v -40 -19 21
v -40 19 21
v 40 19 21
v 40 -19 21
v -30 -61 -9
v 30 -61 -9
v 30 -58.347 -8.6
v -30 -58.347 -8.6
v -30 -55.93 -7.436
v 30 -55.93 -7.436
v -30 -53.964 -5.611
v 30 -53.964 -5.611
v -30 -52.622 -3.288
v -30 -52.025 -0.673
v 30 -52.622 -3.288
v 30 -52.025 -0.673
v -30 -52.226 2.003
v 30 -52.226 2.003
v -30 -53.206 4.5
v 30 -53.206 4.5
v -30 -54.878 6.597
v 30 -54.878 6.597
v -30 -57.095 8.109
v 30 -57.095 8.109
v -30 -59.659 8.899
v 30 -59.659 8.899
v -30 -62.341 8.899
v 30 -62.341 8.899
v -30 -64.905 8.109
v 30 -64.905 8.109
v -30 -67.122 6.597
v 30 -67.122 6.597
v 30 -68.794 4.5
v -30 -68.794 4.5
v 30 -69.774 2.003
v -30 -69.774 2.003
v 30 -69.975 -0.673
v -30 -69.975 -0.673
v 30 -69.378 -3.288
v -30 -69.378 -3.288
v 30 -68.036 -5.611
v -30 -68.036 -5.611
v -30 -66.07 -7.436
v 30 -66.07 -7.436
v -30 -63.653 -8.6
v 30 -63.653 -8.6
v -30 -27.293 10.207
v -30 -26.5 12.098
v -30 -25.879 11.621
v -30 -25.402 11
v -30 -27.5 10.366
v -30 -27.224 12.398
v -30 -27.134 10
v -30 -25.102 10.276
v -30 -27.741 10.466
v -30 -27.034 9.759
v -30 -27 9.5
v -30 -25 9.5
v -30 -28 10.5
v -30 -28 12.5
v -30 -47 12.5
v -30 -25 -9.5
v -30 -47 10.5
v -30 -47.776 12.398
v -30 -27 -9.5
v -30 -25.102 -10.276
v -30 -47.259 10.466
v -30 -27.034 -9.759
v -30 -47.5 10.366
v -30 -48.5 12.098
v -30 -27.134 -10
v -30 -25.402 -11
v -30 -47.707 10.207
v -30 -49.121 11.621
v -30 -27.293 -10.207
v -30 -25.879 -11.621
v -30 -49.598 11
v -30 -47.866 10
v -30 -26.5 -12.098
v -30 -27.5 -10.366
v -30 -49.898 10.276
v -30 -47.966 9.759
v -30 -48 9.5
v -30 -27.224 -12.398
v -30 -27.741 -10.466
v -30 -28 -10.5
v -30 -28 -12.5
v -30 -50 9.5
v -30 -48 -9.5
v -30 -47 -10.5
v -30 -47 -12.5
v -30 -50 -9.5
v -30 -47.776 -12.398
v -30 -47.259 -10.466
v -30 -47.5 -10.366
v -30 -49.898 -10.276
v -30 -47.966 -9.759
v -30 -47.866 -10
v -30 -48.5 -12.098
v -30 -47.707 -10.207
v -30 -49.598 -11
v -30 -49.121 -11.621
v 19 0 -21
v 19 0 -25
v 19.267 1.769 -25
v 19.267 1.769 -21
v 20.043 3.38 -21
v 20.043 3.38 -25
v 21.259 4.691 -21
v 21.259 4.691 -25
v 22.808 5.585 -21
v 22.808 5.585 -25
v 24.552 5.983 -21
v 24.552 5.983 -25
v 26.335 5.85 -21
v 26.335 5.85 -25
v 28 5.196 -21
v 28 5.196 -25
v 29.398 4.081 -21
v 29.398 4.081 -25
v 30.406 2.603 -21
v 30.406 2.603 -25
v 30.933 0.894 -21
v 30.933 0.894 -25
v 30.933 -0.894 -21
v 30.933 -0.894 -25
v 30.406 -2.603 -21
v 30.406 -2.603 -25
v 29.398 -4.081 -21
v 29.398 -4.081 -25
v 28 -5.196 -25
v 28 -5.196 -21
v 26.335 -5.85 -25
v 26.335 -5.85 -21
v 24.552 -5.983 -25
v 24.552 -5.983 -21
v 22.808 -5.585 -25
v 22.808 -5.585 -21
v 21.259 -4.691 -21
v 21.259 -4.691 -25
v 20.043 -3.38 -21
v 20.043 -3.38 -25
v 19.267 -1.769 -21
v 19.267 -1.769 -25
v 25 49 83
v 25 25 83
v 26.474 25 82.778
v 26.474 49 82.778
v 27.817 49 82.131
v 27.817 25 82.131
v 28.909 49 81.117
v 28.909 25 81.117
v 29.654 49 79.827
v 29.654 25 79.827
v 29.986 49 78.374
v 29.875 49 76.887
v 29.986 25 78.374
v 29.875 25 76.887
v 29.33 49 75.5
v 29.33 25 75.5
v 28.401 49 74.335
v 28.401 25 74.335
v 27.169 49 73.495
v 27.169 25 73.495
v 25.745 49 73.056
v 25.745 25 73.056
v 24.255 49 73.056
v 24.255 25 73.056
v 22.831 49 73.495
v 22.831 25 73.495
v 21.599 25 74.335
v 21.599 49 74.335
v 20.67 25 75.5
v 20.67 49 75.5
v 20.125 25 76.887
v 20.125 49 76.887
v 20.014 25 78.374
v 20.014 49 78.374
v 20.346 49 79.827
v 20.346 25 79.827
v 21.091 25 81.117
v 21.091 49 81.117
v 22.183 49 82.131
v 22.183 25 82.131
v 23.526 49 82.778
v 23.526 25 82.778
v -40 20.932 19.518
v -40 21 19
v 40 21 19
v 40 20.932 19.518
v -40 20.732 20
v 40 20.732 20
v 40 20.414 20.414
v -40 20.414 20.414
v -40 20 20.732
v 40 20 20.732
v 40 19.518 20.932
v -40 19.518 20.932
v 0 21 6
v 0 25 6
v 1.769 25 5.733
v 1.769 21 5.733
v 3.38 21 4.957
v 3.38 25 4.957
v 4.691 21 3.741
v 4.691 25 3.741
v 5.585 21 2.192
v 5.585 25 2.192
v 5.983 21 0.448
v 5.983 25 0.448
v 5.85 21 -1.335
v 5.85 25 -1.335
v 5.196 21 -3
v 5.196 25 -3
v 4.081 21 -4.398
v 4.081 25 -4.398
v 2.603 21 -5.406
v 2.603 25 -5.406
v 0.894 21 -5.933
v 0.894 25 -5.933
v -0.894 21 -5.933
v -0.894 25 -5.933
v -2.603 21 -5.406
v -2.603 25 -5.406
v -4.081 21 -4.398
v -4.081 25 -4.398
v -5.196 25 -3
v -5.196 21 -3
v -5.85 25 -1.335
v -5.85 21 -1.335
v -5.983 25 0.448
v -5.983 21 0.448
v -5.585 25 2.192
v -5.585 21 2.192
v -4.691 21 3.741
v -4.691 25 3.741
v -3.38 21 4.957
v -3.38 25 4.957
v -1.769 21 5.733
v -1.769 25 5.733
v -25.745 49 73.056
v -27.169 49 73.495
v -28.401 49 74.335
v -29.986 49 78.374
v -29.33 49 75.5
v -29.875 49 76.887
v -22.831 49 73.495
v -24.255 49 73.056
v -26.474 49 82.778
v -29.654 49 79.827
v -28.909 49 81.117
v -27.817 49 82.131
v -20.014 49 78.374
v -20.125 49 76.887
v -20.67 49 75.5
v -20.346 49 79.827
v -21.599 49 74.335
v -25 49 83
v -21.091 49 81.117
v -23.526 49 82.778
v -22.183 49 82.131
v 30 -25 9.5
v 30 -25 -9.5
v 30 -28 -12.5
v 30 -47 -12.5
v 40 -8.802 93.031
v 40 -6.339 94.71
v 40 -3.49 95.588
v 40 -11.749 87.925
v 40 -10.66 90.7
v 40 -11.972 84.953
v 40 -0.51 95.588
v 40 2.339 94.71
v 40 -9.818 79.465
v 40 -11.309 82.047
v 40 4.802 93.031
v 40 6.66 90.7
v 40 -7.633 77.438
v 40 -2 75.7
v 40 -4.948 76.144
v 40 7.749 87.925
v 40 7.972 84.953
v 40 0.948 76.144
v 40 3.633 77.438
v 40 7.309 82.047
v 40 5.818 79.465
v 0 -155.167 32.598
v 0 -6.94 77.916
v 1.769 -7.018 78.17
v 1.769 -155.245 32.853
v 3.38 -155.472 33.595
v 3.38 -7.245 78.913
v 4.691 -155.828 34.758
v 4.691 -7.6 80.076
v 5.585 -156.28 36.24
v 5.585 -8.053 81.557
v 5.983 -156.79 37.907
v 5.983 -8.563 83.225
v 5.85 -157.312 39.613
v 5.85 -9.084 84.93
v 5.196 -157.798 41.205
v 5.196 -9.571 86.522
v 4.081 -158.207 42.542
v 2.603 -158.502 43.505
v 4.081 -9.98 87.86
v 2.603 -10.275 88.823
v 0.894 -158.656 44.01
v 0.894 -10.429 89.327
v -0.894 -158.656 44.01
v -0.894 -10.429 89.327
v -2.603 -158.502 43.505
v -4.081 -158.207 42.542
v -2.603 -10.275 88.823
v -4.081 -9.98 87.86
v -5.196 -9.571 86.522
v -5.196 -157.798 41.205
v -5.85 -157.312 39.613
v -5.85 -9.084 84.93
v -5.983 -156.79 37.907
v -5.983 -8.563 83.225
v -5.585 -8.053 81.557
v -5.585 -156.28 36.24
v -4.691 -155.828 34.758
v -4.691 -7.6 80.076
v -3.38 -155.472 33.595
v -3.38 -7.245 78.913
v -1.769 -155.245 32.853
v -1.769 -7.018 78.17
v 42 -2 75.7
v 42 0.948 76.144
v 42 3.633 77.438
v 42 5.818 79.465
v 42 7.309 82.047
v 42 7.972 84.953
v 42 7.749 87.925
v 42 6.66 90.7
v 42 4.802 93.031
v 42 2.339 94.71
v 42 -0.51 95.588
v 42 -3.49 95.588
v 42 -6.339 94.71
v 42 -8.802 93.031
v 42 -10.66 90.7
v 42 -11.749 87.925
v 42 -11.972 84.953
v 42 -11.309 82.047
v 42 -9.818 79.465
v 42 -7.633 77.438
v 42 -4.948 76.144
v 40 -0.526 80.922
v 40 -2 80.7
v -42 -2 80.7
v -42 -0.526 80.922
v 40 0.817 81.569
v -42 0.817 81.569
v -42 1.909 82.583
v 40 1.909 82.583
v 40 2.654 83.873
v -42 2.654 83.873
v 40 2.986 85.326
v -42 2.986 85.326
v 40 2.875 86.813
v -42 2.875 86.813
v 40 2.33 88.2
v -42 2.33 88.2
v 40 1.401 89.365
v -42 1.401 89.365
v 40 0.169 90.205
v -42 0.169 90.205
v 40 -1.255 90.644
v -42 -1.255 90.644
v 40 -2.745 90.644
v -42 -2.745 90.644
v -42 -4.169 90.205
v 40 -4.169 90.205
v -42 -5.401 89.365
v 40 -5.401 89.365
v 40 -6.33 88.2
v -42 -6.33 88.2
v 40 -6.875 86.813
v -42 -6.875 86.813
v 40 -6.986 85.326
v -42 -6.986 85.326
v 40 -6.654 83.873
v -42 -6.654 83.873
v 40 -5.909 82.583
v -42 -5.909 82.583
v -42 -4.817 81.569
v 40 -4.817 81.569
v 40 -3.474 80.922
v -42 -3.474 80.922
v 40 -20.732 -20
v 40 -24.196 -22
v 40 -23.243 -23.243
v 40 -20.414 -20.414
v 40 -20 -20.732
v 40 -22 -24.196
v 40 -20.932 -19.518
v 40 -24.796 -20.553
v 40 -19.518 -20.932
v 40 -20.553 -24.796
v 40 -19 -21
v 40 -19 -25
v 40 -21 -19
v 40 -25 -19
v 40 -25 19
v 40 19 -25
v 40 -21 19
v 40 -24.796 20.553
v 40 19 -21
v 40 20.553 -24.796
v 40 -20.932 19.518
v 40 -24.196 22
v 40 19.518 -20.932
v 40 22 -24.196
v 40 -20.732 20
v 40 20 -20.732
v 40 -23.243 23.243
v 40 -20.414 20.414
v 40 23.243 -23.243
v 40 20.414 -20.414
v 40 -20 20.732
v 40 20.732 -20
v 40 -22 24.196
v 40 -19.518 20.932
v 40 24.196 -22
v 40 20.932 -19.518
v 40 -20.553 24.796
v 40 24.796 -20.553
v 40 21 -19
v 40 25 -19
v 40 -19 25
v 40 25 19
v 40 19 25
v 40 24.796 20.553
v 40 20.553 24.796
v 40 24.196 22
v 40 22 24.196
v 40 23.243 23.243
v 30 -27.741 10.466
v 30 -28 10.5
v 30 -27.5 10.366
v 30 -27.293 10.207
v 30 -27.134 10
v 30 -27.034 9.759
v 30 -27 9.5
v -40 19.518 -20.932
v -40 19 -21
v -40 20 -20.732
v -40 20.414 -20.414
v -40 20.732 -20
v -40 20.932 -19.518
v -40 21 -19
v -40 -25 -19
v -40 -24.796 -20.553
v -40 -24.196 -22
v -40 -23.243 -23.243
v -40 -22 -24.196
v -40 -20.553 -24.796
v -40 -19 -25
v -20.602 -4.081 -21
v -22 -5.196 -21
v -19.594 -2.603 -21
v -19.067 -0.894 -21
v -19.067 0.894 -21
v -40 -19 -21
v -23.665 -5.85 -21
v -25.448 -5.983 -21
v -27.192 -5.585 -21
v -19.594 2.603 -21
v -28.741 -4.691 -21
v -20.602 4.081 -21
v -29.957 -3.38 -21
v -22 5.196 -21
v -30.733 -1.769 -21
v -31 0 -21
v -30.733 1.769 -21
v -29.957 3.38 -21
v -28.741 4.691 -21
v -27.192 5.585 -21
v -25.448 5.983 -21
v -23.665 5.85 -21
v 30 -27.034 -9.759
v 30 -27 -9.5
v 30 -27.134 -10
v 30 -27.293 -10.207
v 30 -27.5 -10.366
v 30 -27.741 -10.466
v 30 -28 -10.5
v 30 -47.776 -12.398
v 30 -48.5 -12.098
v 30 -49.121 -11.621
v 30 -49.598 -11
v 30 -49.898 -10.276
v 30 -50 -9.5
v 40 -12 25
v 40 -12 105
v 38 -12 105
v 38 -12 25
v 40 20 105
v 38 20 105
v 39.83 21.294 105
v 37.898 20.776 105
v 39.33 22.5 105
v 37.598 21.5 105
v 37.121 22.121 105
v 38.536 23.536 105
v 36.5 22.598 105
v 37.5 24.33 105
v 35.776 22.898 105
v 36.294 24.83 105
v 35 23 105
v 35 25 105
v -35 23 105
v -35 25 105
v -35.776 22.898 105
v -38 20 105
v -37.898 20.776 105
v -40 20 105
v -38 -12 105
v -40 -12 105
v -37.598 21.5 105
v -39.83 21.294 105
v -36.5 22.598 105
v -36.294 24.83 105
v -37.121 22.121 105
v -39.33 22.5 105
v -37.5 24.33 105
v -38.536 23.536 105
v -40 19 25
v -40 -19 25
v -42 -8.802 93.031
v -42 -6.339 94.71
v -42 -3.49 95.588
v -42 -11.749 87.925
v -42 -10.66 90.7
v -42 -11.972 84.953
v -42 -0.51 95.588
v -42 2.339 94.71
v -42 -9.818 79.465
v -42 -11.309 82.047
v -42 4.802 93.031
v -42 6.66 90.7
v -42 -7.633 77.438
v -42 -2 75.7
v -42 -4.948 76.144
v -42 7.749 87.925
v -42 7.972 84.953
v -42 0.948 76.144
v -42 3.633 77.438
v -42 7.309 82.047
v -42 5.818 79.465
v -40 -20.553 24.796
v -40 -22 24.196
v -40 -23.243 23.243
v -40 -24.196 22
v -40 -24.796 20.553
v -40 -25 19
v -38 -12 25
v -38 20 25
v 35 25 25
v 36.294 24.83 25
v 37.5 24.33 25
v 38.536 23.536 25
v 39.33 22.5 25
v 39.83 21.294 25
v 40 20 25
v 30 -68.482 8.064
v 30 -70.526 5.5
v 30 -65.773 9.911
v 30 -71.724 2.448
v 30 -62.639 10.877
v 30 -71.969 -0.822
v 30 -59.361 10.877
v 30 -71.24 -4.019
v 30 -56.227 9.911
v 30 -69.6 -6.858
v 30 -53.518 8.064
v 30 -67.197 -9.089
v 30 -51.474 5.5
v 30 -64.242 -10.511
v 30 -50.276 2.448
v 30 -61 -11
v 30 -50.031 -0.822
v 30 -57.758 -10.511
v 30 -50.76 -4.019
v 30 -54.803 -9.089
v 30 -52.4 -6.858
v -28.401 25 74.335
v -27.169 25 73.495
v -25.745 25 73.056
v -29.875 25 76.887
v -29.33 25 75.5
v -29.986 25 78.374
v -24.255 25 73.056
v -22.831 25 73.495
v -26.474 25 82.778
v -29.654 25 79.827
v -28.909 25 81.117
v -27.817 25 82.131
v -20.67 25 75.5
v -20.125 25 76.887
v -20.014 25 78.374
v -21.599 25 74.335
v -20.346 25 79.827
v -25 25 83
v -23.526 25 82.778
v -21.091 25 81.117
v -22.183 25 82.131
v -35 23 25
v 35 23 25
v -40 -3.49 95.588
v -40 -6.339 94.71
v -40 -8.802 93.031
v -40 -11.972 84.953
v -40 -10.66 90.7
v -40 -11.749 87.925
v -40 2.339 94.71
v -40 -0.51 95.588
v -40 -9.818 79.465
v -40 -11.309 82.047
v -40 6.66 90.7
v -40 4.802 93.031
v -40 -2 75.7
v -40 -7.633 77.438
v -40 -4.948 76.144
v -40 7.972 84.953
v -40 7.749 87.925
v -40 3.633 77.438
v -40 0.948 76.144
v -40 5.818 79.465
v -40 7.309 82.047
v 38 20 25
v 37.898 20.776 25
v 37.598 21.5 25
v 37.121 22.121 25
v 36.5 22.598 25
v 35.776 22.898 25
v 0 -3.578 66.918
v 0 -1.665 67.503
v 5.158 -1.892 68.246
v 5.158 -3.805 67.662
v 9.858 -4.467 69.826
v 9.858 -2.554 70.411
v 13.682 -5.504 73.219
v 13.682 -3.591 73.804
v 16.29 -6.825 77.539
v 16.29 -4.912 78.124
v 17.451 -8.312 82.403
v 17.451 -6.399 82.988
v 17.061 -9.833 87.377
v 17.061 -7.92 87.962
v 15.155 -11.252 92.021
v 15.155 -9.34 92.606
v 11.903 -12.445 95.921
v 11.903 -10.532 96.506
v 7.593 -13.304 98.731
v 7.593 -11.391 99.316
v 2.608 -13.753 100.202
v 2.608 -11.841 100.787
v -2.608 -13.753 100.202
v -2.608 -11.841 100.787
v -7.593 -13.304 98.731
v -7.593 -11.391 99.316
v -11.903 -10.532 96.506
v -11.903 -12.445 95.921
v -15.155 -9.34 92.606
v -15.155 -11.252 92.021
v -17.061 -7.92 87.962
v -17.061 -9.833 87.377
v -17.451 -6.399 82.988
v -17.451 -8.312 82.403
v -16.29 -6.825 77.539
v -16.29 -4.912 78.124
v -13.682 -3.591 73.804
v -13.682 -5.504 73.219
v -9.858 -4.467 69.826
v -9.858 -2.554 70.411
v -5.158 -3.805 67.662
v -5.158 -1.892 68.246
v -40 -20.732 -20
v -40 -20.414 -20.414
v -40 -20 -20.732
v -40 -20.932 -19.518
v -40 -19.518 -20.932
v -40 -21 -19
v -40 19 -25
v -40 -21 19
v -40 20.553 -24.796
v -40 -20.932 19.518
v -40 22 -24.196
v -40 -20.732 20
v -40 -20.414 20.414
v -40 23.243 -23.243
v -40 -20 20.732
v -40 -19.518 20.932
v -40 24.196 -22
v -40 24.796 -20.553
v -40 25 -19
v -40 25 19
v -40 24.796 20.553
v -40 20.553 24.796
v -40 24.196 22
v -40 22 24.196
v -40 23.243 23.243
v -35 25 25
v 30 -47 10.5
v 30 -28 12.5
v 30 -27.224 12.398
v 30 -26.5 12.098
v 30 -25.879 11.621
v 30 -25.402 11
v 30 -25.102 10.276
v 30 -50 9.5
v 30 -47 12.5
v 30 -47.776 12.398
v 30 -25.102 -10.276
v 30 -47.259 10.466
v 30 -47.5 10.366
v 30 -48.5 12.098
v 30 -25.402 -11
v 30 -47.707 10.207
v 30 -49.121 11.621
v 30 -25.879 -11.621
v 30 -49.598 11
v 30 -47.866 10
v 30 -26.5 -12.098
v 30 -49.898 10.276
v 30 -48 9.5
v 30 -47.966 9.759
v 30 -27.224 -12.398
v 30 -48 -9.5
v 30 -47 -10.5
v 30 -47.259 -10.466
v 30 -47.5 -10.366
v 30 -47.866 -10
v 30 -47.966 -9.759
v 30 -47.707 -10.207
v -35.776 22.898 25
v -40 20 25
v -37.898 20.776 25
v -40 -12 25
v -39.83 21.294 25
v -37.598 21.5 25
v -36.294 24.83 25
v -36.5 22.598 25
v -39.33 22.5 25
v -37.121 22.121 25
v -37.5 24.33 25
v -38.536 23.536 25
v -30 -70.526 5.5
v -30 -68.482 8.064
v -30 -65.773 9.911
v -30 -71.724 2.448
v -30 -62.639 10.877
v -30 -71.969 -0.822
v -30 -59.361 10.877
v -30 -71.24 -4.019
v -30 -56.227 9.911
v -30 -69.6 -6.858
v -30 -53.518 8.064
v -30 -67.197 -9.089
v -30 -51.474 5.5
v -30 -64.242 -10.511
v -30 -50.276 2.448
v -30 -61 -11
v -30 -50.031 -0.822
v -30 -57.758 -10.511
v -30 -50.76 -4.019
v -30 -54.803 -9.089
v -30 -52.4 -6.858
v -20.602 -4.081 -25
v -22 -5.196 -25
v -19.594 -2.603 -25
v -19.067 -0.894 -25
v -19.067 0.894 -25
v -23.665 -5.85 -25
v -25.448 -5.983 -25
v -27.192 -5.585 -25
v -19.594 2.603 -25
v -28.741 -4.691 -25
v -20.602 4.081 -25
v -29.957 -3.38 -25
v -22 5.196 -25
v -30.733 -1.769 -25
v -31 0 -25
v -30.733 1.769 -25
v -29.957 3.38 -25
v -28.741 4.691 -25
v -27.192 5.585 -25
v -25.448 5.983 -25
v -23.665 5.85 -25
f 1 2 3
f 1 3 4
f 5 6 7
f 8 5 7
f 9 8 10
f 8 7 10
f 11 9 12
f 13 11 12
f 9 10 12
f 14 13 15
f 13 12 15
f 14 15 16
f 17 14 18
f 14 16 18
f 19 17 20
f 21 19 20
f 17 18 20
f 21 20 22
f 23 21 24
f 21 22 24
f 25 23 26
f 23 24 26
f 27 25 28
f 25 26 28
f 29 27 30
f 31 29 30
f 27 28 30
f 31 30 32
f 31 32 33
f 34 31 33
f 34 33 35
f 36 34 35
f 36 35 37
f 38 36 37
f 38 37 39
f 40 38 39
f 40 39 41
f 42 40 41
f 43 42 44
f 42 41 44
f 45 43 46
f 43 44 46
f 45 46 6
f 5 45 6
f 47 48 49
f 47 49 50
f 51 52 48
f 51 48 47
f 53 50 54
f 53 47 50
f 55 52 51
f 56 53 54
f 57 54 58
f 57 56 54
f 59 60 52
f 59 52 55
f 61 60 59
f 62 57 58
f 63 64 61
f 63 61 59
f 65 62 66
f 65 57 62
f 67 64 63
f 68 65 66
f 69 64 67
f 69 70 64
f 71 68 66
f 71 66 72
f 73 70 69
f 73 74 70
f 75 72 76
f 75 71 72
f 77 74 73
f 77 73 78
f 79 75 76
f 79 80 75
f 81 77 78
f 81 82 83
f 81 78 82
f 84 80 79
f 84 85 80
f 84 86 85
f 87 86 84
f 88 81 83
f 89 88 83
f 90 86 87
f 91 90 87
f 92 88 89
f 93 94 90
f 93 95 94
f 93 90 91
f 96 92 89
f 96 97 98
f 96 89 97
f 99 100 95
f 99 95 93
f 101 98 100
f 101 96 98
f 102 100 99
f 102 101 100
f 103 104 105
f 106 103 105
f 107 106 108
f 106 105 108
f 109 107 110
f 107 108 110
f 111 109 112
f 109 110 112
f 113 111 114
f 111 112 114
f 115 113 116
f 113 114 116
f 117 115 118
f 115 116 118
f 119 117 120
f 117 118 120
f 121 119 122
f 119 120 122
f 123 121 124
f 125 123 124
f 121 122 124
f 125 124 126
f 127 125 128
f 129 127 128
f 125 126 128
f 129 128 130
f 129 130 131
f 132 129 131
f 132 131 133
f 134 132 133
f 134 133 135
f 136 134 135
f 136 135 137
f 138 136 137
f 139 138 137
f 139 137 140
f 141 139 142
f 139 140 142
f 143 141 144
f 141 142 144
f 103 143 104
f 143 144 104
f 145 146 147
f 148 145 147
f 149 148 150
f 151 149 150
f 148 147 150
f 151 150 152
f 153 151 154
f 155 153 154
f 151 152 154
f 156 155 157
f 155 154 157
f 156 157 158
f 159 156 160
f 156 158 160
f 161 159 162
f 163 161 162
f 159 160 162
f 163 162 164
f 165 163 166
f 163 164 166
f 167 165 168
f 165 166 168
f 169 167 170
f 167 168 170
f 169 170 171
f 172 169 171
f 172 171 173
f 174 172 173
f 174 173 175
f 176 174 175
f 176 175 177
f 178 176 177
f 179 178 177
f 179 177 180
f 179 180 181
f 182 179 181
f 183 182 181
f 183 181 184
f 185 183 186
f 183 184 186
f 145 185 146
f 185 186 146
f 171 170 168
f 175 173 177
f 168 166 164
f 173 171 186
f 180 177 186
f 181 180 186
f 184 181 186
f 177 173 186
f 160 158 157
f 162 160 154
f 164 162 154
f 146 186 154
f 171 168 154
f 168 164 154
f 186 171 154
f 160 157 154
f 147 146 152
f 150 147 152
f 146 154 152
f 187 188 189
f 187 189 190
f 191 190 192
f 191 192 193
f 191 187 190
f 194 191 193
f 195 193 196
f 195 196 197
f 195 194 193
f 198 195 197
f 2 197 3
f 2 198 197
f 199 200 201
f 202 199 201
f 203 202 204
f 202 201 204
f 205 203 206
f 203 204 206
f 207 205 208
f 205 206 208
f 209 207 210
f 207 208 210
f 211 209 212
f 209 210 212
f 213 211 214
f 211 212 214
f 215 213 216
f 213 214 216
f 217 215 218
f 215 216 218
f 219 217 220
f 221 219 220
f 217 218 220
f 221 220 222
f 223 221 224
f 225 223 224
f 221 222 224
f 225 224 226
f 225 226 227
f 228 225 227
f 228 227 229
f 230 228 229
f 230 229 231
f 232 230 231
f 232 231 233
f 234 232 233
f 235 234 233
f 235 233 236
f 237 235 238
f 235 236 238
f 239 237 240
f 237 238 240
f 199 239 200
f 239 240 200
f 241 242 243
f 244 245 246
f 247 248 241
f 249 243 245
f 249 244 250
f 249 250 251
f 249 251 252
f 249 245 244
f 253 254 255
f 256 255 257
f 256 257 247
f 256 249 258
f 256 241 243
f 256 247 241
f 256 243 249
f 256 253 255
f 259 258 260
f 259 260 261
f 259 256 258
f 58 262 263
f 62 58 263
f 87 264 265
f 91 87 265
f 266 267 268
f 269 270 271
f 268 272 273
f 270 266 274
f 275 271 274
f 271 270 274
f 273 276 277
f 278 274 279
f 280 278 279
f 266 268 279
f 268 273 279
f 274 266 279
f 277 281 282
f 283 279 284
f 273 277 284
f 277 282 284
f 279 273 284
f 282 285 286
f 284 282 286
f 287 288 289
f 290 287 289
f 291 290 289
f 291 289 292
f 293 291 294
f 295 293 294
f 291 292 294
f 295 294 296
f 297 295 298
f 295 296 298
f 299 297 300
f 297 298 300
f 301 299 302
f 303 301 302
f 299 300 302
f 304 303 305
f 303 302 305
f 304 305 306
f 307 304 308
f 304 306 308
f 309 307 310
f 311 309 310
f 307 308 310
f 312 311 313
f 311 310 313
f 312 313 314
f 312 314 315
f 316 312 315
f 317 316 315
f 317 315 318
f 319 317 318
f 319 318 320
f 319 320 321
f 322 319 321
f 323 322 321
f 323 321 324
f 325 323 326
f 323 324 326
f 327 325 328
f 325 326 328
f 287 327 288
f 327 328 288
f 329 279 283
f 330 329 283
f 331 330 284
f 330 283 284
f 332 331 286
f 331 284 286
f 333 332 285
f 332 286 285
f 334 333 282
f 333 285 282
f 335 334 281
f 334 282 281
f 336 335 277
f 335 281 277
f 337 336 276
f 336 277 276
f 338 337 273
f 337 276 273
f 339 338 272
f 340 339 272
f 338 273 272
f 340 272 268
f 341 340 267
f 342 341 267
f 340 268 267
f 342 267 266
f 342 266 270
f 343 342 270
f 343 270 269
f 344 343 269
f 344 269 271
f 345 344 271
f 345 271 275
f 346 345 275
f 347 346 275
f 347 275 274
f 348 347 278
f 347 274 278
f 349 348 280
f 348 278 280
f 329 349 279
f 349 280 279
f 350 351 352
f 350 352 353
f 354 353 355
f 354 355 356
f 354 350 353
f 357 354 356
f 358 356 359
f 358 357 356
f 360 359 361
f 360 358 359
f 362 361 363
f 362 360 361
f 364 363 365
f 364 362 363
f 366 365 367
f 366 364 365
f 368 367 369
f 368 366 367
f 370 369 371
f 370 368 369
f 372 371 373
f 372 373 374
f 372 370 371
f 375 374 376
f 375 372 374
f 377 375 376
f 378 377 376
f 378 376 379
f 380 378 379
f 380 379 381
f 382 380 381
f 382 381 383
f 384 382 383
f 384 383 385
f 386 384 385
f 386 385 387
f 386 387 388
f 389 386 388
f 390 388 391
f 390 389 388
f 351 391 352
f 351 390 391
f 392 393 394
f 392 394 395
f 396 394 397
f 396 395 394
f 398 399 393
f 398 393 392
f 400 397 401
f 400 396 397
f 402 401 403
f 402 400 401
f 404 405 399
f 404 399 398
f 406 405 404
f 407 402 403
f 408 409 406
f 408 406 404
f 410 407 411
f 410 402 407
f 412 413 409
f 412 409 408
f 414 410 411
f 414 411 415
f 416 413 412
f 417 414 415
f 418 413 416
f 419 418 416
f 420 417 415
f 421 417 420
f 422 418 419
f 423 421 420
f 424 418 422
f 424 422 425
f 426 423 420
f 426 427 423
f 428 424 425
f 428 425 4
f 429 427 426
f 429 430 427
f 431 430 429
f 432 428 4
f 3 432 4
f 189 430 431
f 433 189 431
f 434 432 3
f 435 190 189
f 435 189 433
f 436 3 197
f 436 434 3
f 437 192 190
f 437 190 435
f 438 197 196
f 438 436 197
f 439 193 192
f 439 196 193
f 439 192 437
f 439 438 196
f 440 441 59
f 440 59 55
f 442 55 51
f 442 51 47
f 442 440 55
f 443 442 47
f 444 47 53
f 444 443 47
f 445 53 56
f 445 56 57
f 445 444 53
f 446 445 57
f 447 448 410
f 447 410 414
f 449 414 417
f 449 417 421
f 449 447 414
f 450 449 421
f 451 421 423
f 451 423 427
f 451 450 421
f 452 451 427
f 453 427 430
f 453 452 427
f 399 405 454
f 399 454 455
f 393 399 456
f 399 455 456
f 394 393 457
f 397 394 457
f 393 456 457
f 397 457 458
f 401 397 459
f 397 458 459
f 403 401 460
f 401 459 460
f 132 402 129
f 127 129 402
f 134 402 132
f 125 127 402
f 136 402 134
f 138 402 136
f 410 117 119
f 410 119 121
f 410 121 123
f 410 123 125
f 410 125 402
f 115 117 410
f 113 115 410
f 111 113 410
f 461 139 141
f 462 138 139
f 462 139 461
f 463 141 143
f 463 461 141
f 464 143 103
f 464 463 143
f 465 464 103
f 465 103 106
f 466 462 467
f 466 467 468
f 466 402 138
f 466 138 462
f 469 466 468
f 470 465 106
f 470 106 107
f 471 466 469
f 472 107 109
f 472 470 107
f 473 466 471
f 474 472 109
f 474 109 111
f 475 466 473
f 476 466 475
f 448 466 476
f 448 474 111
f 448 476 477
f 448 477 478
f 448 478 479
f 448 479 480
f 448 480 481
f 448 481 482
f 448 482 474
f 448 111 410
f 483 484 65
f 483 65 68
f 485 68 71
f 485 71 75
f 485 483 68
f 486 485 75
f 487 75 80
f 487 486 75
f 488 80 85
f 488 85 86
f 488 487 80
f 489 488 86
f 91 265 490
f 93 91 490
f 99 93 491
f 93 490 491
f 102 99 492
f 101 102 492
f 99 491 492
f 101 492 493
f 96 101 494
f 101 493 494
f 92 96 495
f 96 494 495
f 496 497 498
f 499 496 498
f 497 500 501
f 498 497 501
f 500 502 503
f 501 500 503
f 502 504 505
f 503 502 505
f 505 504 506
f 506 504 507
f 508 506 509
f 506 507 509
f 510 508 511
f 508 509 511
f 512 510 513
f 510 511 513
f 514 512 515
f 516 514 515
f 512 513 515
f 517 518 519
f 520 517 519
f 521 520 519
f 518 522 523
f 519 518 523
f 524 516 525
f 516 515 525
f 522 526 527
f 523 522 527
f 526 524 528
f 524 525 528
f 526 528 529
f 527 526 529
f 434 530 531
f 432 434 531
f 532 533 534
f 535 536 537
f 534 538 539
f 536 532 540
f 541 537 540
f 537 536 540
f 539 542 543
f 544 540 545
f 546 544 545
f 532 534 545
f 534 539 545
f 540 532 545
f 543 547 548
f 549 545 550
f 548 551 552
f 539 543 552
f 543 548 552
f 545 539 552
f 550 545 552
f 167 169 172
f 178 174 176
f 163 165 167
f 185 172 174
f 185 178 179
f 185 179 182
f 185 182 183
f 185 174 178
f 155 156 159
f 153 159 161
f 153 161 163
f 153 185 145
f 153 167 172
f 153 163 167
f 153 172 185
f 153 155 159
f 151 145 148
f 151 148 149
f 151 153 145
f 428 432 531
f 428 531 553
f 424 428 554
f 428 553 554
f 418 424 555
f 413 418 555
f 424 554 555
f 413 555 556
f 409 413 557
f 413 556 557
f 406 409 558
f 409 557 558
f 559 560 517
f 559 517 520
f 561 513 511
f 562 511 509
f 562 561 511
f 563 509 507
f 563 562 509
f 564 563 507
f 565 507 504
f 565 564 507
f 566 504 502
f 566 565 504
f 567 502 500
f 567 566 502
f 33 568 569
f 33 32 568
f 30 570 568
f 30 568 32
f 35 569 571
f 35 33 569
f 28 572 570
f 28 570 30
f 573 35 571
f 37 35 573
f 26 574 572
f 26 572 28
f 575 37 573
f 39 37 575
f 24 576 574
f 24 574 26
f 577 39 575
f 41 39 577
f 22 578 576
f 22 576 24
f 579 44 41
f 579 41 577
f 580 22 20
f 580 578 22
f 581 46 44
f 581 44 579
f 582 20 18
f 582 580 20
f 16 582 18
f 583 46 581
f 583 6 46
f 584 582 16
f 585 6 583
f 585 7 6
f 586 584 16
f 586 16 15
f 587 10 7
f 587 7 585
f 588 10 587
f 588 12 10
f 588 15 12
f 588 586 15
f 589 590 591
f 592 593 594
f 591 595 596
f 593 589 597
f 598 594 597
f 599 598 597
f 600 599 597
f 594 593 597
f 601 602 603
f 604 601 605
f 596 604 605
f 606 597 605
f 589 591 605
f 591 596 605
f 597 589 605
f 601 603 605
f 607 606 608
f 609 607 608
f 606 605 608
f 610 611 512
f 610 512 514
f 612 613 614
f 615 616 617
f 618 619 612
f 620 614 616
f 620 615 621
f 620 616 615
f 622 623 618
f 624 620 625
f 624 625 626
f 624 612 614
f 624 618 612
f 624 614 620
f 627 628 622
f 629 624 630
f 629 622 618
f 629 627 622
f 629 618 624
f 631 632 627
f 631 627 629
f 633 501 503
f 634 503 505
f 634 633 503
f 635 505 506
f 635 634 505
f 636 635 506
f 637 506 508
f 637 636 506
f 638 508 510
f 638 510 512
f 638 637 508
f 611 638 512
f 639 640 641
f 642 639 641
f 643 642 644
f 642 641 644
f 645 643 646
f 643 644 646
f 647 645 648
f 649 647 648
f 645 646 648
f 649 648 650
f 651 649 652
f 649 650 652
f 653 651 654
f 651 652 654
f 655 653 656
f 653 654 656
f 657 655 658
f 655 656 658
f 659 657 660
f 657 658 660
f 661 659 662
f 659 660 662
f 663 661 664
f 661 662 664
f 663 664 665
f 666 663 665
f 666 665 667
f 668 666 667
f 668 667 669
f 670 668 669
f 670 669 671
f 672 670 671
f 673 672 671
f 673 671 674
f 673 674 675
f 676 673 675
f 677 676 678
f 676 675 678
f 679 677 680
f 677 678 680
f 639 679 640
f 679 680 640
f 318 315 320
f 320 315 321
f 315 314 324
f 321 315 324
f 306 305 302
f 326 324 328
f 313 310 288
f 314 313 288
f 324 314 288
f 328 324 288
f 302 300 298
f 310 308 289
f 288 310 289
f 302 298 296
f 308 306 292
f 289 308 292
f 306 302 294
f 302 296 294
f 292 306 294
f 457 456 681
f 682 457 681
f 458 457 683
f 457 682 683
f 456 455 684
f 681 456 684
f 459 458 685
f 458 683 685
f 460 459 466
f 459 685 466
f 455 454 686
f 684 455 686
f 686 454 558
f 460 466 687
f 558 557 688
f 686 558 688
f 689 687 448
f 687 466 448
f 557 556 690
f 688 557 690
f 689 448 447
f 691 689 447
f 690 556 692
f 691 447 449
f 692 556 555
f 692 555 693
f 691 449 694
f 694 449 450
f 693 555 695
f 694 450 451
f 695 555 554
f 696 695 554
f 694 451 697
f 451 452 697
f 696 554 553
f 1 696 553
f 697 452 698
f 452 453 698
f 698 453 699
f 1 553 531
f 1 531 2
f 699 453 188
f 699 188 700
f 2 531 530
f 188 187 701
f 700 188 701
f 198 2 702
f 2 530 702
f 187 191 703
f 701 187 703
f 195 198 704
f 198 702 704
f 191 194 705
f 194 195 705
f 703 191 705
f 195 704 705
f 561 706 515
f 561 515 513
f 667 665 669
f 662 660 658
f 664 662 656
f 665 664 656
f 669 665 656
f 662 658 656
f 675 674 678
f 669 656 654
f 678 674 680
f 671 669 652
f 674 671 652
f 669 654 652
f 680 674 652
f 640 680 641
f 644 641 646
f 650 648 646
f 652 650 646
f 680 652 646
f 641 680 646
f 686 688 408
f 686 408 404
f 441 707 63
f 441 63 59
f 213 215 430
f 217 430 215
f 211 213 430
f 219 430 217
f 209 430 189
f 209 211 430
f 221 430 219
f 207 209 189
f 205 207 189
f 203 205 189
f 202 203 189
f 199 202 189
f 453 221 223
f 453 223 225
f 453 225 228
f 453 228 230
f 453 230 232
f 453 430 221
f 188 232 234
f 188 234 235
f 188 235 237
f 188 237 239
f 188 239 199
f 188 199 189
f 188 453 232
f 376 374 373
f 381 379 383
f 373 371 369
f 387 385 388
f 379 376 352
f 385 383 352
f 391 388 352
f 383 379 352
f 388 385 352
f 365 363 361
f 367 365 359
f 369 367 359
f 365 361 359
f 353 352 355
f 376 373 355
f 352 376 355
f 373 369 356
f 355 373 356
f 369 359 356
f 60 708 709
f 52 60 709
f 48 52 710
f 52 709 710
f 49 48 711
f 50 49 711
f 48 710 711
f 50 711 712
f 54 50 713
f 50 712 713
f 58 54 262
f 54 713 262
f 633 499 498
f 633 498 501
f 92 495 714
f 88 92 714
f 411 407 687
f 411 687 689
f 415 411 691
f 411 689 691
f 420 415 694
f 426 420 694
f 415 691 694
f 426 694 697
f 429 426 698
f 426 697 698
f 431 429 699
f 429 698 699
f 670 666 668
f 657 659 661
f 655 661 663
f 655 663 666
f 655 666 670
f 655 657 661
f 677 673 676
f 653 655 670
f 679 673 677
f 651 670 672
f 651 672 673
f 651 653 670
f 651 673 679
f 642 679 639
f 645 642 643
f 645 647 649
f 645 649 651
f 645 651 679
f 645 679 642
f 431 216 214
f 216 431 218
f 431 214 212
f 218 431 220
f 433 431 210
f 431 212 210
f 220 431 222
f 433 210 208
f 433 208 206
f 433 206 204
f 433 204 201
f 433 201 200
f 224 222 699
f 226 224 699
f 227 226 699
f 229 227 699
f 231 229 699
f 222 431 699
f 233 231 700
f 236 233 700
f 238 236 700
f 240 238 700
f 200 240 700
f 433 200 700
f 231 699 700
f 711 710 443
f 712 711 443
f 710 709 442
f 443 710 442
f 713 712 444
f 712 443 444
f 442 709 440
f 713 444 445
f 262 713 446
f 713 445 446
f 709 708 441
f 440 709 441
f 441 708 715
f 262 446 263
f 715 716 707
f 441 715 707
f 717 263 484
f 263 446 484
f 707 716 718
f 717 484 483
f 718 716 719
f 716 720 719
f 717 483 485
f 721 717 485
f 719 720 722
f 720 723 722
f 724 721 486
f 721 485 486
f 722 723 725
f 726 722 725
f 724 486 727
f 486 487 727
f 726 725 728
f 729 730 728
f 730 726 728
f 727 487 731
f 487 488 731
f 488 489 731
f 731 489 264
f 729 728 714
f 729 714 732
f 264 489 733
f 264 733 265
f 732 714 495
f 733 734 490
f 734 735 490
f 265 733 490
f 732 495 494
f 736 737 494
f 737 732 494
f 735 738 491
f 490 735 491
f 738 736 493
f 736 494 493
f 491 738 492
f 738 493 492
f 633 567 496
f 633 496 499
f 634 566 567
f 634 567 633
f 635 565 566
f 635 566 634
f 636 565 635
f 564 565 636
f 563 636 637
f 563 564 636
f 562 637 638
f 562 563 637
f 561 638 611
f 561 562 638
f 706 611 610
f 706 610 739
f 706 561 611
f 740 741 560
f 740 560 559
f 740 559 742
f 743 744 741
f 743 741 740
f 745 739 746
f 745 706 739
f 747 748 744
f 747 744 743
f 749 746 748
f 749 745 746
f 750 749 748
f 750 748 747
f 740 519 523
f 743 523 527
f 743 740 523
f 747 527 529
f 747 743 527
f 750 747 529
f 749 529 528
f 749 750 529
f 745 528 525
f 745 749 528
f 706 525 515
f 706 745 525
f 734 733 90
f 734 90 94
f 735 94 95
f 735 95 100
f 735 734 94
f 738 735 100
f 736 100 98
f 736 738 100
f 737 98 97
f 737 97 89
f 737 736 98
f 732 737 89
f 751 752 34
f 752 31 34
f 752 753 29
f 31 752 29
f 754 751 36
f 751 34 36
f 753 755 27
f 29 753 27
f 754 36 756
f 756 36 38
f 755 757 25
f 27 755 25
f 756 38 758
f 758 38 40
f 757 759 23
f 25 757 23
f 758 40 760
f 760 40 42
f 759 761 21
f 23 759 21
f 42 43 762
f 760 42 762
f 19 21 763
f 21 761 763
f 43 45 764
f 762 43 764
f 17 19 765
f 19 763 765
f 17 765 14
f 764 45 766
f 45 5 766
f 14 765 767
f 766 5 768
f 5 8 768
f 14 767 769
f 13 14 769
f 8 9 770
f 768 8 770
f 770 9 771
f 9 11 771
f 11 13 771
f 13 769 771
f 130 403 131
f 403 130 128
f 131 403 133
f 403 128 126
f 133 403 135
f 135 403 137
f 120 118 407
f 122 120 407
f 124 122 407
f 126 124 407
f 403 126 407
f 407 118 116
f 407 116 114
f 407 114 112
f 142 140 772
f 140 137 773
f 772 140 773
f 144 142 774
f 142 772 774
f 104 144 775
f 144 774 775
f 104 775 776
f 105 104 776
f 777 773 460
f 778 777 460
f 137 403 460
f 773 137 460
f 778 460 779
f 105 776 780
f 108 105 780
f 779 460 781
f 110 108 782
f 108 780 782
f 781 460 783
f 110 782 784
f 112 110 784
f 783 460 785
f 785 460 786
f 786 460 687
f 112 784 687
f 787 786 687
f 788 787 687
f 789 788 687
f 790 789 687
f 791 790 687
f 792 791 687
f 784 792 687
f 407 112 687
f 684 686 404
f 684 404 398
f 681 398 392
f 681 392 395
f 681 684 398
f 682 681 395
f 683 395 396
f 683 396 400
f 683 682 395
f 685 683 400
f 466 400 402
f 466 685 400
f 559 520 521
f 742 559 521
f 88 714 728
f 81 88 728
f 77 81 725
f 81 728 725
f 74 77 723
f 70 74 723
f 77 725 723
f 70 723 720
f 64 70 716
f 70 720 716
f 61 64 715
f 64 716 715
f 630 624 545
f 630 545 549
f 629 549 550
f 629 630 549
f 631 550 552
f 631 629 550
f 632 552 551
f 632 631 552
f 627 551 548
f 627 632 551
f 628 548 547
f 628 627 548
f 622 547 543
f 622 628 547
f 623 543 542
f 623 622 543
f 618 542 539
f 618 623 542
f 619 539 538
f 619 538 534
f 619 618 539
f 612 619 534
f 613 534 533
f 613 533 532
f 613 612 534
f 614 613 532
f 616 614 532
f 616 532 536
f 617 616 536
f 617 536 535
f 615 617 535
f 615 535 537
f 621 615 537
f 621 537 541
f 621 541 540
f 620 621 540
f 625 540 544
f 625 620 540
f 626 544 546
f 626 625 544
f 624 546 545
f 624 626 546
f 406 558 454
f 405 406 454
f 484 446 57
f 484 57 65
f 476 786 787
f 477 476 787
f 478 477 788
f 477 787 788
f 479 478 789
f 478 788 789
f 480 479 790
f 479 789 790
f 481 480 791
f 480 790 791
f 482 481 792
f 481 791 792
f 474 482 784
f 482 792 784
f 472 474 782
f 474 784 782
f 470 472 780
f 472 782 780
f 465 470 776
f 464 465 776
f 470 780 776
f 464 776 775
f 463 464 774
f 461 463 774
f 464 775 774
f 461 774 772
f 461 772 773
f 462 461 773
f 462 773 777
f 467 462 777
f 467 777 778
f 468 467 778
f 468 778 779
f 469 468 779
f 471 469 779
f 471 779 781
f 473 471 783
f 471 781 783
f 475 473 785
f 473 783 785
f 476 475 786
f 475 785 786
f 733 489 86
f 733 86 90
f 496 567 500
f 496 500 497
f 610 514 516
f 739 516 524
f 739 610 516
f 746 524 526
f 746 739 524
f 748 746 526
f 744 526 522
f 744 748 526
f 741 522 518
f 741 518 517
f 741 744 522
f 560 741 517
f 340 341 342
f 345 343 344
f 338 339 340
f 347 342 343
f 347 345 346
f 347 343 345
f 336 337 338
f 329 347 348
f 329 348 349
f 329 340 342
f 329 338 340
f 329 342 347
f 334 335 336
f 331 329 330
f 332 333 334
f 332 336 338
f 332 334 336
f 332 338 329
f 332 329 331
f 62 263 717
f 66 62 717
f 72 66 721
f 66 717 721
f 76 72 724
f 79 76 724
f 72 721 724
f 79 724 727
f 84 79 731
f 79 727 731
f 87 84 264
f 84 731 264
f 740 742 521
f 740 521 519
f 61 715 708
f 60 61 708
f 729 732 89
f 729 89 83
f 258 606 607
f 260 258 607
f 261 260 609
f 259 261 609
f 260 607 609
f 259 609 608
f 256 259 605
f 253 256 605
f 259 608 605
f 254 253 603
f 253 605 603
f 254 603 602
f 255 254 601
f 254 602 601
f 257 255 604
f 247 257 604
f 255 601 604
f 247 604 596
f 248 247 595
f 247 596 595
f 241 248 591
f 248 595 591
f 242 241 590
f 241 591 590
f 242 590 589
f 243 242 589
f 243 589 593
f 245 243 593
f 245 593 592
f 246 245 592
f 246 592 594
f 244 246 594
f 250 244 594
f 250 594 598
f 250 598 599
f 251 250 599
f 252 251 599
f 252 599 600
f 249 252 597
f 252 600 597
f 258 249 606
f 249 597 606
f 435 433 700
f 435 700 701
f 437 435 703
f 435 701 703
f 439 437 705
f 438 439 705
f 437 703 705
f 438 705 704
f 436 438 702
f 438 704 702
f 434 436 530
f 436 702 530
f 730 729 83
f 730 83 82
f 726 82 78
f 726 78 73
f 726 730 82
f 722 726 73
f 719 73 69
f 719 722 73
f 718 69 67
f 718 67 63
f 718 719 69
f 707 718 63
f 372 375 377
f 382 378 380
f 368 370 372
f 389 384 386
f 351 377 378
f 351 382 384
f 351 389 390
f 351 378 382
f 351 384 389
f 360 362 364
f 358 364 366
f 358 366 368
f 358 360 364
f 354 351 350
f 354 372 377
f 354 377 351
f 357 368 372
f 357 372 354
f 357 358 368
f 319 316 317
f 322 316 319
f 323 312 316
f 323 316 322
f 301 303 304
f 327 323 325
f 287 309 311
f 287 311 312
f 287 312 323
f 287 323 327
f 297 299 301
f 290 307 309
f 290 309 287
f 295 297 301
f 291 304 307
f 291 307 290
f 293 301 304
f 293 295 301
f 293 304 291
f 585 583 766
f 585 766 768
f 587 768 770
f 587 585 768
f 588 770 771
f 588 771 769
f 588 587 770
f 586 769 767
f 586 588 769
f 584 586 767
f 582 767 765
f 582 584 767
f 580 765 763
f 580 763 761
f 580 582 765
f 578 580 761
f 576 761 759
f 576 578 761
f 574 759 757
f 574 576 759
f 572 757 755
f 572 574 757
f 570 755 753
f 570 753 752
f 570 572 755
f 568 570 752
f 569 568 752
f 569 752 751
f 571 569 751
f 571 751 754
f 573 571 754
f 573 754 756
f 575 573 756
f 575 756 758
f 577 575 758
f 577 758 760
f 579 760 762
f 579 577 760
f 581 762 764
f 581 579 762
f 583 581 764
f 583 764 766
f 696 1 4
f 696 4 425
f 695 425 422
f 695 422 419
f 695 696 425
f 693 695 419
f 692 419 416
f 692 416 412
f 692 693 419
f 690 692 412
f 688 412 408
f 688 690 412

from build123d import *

# Parameters (mm, degrees)
BXBXS_8639_82_50_X_50_X_4_1_DEPTH = 80
EXTRUDE_1_DEPTH                   = 80
BXBXS_8639_82_25_X_25_X_2_1_DEPTH = 60
SKETCH_6_R                        = 11
SKETCH_6_R_2                      = 9
EXTRUDE_2_DEPTH                   = 60
SKETCH_7_R                        = 10
SKETCH_7_R_2                      = 5
EXTRUDE_3_DEPTH                   = 2
SKETCH_7_3_R                      = 5
EXTRUDE_4_DEPTH                   = 82
SKETCH_8_R                        = 17.5
EXTRUDE_5_DEPTH                   = 2
SKETCH_9_R                        = 5
EXTRUDE_6_DEPTH                   = 24
EXTRUDE_6_2_DEPTH                 = 24
SKETCH_10_R                       = 6
CUT_EXTRUDE_1_DEPTH               = 4
SKETCH_11_R                       = 6
CUT_EXTRUDE_2_DEPTH               = 4
SKETCH_12_R                       = 6
EXTRUDE_7_DEPTH                   = 155


with BuildPart() as part:
    # Sketch1 → Труба bxbxs гост8639-82 50 X 50 X 4(1) (new body)
    with BuildSketch(Plane.YZ.offset(-40)):
        with BuildLine():
            Line((-19, -25), (19, -25))
            ThreePointArc((19, -25), (23.242640687, -23.242640687), (25, -19))
            Line((25, -19), (25, 19))
            ThreePointArc((25, 19), (23.242640687, 23.242640687), (19, 25))
            Line((19, 25), (-19, 25))
            ThreePointArc((-19, 25), (-23.242640687, 23.242640687), (-25, 19))
            Line((-25, 19), (-25, -19))
            ThreePointArc((-25, -19), (-23.242640687, -23.242640687), (-19, -25))
        make_face()
        with BuildLine():
            Line((-19, -21), (19, -21))
            ThreePointArc((19, -21), (20.414213562, -20.414213562), (21, -19))
            Line((21, -19), (21, 19))
            ThreePointArc((21, 19), (20.414213562, 20.414213562), (19, 21))
            Line((19, 21), (-19, 21))
            ThreePointArc((-19, 21), (-20.414213562, 20.414213562), (-21, 19))
            Line((-21, 19), (-21, -19))
            ThreePointArc((-21, -19), (-20.414213562, -20.414213562), (-19, -21))
        make_face(mode=Mode.SUBTRACT)
    extrude(amount=BXBXS_8639_82_50_X_50_X_4_1_DEPTH)

    # Эскиз10 → Вырез-Вытянуть1 (cut)
    with BuildSketch(Plane(origin=(0, 25, 0), x_dir=(1, 0, 0), z_dir=(0, 1, 0))):
        with Locations(Location((0, 0, 0), (0, 0, 270))):
            Circle(SKETCH_10_R)
    extrude(amount=-CUT_EXTRUDE_1_DEPTH, mode=Mode.SUBTRACT)

    # Эскиз11 → Вырез-Вытянуть2 (cut)
    with BuildSketch(Plane(origin=(0, 0, -25), x_dir=(-1, 0, 0), z_dir=(0, 0, -1))):
        with Locations((25, 0)):
            Circle(SKETCH_11_R)
        with Locations((-25, 0)):
            Circle(SKETCH_11_R)
    extrude(amount=-CUT_EXTRUDE_2_DEPTH, mode=Mode.SUBTRACT)


with BuildPart() as body_2:
    # Эскиз3 → Бобышка-Вытянуть1 (new body)
    with BuildSketch(Plane.XY.offset(25)):
        with BuildLine():
            Line((-40, -12), (-40, 20))
            ThreePointArc((-40, 20), (-38.535533906, 23.535533906), (-35, 25))
            Line((-35, 25), (35, 25))
            ThreePointArc((35, 25), (38.535533906, 23.535533906), (40, 20))
            Line((40, 20), (40, -12))
            Line((40, -12), (38, -12))
            Line((38, -12), (38, 20))
            ThreePointArc((38, 20), (37.121320344, 22.121320344), (35, 23))
            Line((35, 23), (-35, 23))
            ThreePointArc((-35, 23), (-37.121320344, 22.121320344), (-38, 20))
            Line((-38, 20), (-38, -12))
            Line((-38, -12), (-40, -12))
        make_face()
    extrude(amount=EXTRUDE_1_DEPTH)


with BuildPart() as body_3:
    # Sketch11 → Труба bxbxs гост8639-82 25 X 25 X 2(1) (new body)
    with BuildSketch(Plane(origin=(30, -37.5, 0), x_dir=(0, 0, -1), z_dir=(-1, 0, 0))):
        with BuildLine():
            Line((-9.5, -12.5), (9.5, -12.5))
            ThreePointArc((9.5, -12.5), (11.621320344, -11.621320344), (12.5, -9.5))
            Line((12.5, -9.5), (12.5, 9.5))
            ThreePointArc((12.5, 9.5), (11.621320344, 11.621320344), (9.5, 12.5))
            Line((9.5, 12.5), (-9.5, 12.5))
            ThreePointArc((-9.5, 12.5), (-11.621320344, 11.621320344), (-12.5, 9.5))
            Line((-12.5, 9.5), (-12.5, -9.5))
            ThreePointArc((-12.5, -9.5), (-11.621320344, -11.621320344), (-9.5, -12.5))
        make_face()
        with BuildLine():
            Line((-9.5, -10.5), (9.5, -10.5))
            ThreePointArc((9.5, -10.5), (10.207106781, -10.207106781), (10.5, -9.5))
            Line((10.5, -9.5), (10.5, 9.5))
            ThreePointArc((10.5, 9.5), (10.207106781, 10.207106781), (9.5, 10.5))
            Line((9.5, 10.5), (-9.5, 10.5))
            ThreePointArc((-9.5, 10.5), (-10.207106781, 10.207106781), (-10.5, 9.5))
            Line((-10.5, 9.5), (-10.5, -9.5))
            ThreePointArc((-10.5, -9.5), (-10.207106781, -10.207106781), (-9.5, -10.5))
        make_face(mode=Mode.SUBTRACT)
    extrude(amount=BXBXS_8639_82_25_X_25_X_2_1_DEPTH)


with BuildPart() as body_4:
    # Эскиз6 → Бобышка-Вытянуть2 (new body)
    with BuildSketch(Plane(origin=(30, 0, 0), x_dir=(0, 0, -1), z_dir=(1, 0, 0))):
        with Locations((0, -61)):
            Circle(SKETCH_6_R)
        with Locations((0, -61)):
            Circle(SKETCH_6_R_2, mode=Mode.SUBTRACT)
    extrude(amount=-EXTRUDE_2_DEPTH)


with BuildPart() as body_5:
    # Эскиз7 → Бобышка-Вытянуть3 (new body)
    # profile 1 of 2: a face of its own
    with BuildSketch(Plane(origin=(40, 0, 0), x_dir=(0, 0, -1), z_dir=(1, 0, 0))):
        with Locations((-85.7, -2)):
            Circle(SKETCH_7_R)
        with Locations((-85.7, -2)):
            Circle(SKETCH_7_R_2, mode=Mode.SUBTRACT)
    # profile 2 of 2: a face of its own
    with BuildSketch(Plane(origin=(40, 0, 0), x_dir=(0, 0, -1), z_dir=(1, 0, 0))):
        with Locations((-85.7, -2)):
            Circle(SKETCH_7_R_2)
    extrude(amount=EXTRUDE_3_DEPTH)


with BuildPart() as body_6:
    # Зеркальное отражение1: mirrored copy
    add(body_5.part.mirror(Plane(origin=(0, 0, 0), x_dir=(0, 0, 1), z_dir=(1, 0, 0))))


with BuildPart() as body_7:
    # Эскиз7<3> → Бобышка-Вытянуть4 (new body)
    with BuildSketch(Plane(origin=(40, 0, 0), x_dir=(0, 0, -1), z_dir=(1, 0, 0))):
        with Locations((-85.7, -2)):
            Circle(SKETCH_7_3_R)
    extrude(amount=-EXTRUDE_4_DEPTH)


with BuildPart() as body_8:
    # Эскиз8 → Бобышка-Вытянуть5 (new body)
    with BuildSketch(Plane(origin=(0, 17.350854561, 5.304688589), x_dir=(1, 0, 0), z_dir=(0, -0.9563047559630353, -0.2923717047227373))):
        with Locations(Location((0, 82.540060995, 0), (0, 0, 270))):
            Circle(SKETCH_8_R)
    extrude(amount=EXTRUDE_5_DEPTH)


with BuildPart() as body_9:
    # Эскиз9 → Бобышка-Вытянуть6 (new body)
    with BuildSketch(Plane(origin=(0, 25, 0), x_dir=(1, 0, 0), z_dir=(0, 1, 0))):
        with Locations(Location((-25, -78, 0), (0, 0, 270))):
            Circle(SKETCH_9_R)
    extrude(amount=EXTRUDE_6_DEPTH)


with BuildPart() as body_10:
    # Эскиз9 → Extrude 6 2 (new body)
    with BuildSketch(Plane(origin=(0, 25, 0), x_dir=(1, 0, 0), z_dir=(0, 1, 0))):
        with Locations(Location((25, -78, 0), (0, 0, 270))):
            Circle(SKETCH_9_R)
    extrude(amount=EXTRUDE_6_2_DEPTH)


with BuildPart() as body_11:
    # Эскиз12 → Бобышка-Вытянуть7 (new body)
    with BuildSketch(Plane(origin=(0, 15.438245049, 4.719945179), x_dir=(1, 0, 0), z_dir=(0, -0.9563047559630353, -0.2923717047227373))):
        with Locations(Location((0, 82.540060995, 0), (0, 0, 270))):
            Circle(SKETCH_12_R)
    extrude(amount=EXTRUDE_7_DEPTH)


solid = Compound([part.part, body_2.part, body_3.part, body_4.part, body_5.part, body_6.part, body_7.part, body_8.part, body_9.part, body_10.part, body_11.part])
